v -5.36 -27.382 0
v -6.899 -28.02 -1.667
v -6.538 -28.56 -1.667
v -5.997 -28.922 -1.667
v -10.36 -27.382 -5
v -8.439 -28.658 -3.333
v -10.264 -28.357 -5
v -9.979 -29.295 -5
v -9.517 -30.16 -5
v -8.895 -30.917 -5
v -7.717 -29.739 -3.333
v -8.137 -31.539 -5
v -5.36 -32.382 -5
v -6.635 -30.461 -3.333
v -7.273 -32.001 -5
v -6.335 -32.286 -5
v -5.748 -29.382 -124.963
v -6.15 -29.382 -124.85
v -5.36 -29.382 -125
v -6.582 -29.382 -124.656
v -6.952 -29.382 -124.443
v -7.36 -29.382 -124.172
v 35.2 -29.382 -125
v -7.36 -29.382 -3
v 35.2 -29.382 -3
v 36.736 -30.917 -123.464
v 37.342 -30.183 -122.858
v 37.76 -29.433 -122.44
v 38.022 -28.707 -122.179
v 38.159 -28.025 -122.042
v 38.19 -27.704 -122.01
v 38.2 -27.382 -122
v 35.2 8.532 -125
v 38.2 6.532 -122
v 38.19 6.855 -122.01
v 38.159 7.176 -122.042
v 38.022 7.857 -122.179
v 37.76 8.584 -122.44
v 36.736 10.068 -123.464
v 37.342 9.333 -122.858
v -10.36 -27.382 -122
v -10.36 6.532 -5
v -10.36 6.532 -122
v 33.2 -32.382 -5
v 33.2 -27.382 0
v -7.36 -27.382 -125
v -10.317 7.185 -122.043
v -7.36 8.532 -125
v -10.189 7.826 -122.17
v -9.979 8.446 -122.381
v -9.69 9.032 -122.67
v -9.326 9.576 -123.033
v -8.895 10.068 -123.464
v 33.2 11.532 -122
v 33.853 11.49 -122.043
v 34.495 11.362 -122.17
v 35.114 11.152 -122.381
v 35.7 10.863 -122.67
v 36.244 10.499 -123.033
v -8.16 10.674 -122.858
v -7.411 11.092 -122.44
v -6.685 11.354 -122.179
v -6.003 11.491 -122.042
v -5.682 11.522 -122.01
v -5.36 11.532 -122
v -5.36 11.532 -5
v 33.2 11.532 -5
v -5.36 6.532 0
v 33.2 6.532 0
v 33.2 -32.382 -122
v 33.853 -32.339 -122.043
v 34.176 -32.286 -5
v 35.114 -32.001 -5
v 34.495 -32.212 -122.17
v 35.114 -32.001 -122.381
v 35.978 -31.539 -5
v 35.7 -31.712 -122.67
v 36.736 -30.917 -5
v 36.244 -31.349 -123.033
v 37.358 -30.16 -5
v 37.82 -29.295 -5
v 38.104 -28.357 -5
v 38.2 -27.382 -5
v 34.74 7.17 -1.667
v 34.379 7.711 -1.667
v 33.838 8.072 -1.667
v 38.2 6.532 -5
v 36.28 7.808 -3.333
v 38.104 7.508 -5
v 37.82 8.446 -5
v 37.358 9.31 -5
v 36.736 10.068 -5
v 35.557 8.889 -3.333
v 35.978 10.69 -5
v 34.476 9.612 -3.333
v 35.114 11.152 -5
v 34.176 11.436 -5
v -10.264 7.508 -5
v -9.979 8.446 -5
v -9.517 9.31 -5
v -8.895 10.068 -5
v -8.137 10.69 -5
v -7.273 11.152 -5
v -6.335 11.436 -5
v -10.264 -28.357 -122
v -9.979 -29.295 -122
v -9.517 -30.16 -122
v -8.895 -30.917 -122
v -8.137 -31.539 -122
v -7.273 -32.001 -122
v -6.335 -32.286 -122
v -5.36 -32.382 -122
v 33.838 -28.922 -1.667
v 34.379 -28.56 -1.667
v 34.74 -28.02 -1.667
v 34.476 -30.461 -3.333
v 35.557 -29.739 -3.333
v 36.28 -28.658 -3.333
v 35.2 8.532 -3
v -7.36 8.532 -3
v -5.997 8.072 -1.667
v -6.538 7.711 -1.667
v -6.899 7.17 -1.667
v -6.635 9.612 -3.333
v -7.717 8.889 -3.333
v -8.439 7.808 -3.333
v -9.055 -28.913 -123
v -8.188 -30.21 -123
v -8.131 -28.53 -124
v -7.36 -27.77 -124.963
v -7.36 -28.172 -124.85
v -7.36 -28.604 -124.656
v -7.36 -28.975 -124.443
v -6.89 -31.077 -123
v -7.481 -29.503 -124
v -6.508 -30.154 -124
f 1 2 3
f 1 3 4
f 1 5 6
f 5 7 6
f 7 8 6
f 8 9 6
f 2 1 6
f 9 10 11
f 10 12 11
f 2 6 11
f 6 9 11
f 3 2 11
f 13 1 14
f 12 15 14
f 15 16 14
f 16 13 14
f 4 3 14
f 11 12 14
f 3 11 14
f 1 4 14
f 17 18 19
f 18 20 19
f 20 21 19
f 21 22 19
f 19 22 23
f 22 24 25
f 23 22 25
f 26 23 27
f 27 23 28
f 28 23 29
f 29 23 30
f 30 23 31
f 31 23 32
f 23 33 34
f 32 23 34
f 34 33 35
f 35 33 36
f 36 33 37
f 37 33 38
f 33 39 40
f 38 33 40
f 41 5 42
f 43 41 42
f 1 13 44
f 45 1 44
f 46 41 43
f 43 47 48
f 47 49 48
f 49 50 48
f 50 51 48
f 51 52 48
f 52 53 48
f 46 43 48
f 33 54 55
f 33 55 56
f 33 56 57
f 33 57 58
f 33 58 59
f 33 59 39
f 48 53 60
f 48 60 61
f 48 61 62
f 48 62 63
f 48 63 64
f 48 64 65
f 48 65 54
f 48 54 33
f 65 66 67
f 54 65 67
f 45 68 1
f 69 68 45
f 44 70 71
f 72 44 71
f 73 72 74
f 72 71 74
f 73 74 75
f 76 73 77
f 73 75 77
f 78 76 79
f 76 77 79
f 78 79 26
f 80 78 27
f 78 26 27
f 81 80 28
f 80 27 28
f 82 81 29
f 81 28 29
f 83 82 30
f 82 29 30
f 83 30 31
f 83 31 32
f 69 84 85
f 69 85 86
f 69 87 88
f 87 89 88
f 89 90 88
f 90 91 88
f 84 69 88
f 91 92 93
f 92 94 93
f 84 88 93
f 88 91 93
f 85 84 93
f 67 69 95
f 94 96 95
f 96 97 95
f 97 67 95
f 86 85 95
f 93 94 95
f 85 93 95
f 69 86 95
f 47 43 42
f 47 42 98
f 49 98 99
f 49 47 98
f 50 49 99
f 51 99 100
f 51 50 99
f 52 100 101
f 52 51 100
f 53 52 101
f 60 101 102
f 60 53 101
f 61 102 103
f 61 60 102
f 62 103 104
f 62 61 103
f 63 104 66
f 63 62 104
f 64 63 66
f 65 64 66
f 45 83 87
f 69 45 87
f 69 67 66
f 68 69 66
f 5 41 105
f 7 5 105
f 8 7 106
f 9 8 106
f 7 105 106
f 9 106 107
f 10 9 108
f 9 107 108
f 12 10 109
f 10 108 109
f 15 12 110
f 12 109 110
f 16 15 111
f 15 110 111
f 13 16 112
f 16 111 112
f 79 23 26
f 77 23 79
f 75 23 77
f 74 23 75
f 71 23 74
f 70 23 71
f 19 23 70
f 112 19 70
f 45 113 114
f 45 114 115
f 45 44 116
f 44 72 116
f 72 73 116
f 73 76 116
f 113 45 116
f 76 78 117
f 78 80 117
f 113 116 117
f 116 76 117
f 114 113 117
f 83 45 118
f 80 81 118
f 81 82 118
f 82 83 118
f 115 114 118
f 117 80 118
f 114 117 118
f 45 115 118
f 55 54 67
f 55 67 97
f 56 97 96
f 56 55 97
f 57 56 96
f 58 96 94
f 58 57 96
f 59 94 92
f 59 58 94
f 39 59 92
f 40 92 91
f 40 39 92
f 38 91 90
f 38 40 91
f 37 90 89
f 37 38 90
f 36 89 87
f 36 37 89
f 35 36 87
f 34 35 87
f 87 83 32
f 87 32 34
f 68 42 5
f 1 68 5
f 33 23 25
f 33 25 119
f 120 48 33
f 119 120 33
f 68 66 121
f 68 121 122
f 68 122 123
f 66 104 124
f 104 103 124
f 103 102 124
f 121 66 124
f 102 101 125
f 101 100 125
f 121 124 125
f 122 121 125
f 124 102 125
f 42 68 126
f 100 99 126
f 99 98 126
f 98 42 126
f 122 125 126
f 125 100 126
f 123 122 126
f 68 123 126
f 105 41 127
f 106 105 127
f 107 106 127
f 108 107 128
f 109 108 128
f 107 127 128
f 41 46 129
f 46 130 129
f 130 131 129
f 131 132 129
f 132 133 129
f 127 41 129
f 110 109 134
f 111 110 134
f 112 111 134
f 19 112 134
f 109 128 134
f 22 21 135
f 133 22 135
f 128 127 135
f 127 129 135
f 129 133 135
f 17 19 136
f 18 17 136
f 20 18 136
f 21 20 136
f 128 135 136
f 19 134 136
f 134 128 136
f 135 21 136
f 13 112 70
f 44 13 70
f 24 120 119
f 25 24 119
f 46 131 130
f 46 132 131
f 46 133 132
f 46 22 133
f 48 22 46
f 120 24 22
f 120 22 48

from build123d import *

# Parameters (mm, degrees)
F0_W         = 48.5600655451
F0_H         = 43.9142854884
F0_W_2       = 42.5600655451
F0_H_2       = 37.9142854884
F1_DEPTH     = 127
F2_DEPTH     = 3
F3_R         = 5
F4_T1_DEPTH  = 51.7727004283
F4_T3_DEPTH  = 69.6311153681
F4_T5_DEPTH  = 74.2768954248
F4_T7_DEPTH  = 56.418480485
F4_T10_ANGLE = 90
F5_R         = 5
F6_SIZE      = 5


# Not quite as in the source:
# - a fillet or chamfer that OpenCascade refuses, or shapes differently, is made with other operations: its cross-section is extruded or revolved along the edge and cut away or added


with BuildPart() as f1:
    # F0 (on Top) → F1 (new body)
    with BuildSketch(Plane.XY):
        with Locations((13.9204316549, -10.4247569107)):
            Rectangle(F0_W, F0_H)
        with Locations((13.9204316549, -10.4247569107)):
            Rectangle(F0_W_2, F0_H_2, mode=Mode.SUBTRACT)
    extrude(amount=-F1_DEPTH)

    # F0 (on Top) → F2 (join)
    with BuildSketch(Plane.XY):
        with Locations((13.9204316549, -10.4247569107)):
            Rectangle(F0_W_2, F0_H_2)
    extrude(amount=-F2_DEPTH)

    # F3
    f3_edges = [f1.edges().sort_by_distance(p)[0] for p in [
        (-10.359601, -32.3819, -63.5),
    ]]
    fillet(f3_edges, radius=F3_R)

    # F4: chamfer of 5 on 3 edges, made by hand

    # F4_s2 → F4_t1 (cut)
    with BuildSketch(Plane.XZ.offset(-24.3908007734)):
        Polygon((-10.3596011177, -122), (-5.3596011177, -127), (-10.3596011177, -127), align=None)
    extrude(amount=F4_T1_DEPTH, mode=Mode.SUBTRACT)

    # F4_s4 → F4_t3 (cut)
    with BuildSketch(Plane.XZ.offset(-24.3908007734)):
        Polygon((33.2004644275, -127), (38.2004644275, -122), (38.2004644275, -127), align=None)
    extrude(amount=F4_T3_DEPTH, mode=Mode.SUBTRACT)

    # F4_s6 → F4_t5 (cut)
    with BuildSketch(Plane.YZ.offset(-23.2180160575)):
        Polygon((11.5323858336, -122), (6.5323858336, -127), (11.5323858336, -127), align=None)
    extrude(amount=F4_T5_DEPTH, mode=Mode.SUBTRACT)

    # F4_s8 → F4_t7 (cut)
    with BuildSketch(Plane.YZ.offset(-5.3596011177)):
        Polygon((-27.3818996549, -127), (-32.3818996549, -122), (-32.3818996549, -127), align=None)
    extrude(amount=F4_T7_DEPTH, mode=Mode.SUBTRACT)

    # F4_s9 → F4_t10 (revolve, cut)
    with BuildSketch(Plane.XZ.offset(27.3818996549)):
        Polygon((-10.3596011177, -122), (-5.3596011177, -127), (-10.3596011177, -127), align=None)
    revolve(axis=Axis((-5.3596011177, -27.3818996549, -127), (0, 0, 1)), revolution_arc=F4_T10_ANGLE, mode=Mode.SUBTRACT)

    # F5
    f5_edges = [f1.edges().sort_by_distance(p)[0] for p in [
        (-10.359601, 11.532386, -61),
        (38.200464, 11.532386, -61),
        (38.200464, -32.3819, -61),
    ]]
    fillet(f5_edges, radius=F5_R)

    # F6
    f6_edges = [f1.edges().sort_by_distance(p)[0] for p in [
        (13.920432, -32.3819, 0),
    ]]
    chamfer(f6_edges, length=F6_SIZE)


solid = f1.part
